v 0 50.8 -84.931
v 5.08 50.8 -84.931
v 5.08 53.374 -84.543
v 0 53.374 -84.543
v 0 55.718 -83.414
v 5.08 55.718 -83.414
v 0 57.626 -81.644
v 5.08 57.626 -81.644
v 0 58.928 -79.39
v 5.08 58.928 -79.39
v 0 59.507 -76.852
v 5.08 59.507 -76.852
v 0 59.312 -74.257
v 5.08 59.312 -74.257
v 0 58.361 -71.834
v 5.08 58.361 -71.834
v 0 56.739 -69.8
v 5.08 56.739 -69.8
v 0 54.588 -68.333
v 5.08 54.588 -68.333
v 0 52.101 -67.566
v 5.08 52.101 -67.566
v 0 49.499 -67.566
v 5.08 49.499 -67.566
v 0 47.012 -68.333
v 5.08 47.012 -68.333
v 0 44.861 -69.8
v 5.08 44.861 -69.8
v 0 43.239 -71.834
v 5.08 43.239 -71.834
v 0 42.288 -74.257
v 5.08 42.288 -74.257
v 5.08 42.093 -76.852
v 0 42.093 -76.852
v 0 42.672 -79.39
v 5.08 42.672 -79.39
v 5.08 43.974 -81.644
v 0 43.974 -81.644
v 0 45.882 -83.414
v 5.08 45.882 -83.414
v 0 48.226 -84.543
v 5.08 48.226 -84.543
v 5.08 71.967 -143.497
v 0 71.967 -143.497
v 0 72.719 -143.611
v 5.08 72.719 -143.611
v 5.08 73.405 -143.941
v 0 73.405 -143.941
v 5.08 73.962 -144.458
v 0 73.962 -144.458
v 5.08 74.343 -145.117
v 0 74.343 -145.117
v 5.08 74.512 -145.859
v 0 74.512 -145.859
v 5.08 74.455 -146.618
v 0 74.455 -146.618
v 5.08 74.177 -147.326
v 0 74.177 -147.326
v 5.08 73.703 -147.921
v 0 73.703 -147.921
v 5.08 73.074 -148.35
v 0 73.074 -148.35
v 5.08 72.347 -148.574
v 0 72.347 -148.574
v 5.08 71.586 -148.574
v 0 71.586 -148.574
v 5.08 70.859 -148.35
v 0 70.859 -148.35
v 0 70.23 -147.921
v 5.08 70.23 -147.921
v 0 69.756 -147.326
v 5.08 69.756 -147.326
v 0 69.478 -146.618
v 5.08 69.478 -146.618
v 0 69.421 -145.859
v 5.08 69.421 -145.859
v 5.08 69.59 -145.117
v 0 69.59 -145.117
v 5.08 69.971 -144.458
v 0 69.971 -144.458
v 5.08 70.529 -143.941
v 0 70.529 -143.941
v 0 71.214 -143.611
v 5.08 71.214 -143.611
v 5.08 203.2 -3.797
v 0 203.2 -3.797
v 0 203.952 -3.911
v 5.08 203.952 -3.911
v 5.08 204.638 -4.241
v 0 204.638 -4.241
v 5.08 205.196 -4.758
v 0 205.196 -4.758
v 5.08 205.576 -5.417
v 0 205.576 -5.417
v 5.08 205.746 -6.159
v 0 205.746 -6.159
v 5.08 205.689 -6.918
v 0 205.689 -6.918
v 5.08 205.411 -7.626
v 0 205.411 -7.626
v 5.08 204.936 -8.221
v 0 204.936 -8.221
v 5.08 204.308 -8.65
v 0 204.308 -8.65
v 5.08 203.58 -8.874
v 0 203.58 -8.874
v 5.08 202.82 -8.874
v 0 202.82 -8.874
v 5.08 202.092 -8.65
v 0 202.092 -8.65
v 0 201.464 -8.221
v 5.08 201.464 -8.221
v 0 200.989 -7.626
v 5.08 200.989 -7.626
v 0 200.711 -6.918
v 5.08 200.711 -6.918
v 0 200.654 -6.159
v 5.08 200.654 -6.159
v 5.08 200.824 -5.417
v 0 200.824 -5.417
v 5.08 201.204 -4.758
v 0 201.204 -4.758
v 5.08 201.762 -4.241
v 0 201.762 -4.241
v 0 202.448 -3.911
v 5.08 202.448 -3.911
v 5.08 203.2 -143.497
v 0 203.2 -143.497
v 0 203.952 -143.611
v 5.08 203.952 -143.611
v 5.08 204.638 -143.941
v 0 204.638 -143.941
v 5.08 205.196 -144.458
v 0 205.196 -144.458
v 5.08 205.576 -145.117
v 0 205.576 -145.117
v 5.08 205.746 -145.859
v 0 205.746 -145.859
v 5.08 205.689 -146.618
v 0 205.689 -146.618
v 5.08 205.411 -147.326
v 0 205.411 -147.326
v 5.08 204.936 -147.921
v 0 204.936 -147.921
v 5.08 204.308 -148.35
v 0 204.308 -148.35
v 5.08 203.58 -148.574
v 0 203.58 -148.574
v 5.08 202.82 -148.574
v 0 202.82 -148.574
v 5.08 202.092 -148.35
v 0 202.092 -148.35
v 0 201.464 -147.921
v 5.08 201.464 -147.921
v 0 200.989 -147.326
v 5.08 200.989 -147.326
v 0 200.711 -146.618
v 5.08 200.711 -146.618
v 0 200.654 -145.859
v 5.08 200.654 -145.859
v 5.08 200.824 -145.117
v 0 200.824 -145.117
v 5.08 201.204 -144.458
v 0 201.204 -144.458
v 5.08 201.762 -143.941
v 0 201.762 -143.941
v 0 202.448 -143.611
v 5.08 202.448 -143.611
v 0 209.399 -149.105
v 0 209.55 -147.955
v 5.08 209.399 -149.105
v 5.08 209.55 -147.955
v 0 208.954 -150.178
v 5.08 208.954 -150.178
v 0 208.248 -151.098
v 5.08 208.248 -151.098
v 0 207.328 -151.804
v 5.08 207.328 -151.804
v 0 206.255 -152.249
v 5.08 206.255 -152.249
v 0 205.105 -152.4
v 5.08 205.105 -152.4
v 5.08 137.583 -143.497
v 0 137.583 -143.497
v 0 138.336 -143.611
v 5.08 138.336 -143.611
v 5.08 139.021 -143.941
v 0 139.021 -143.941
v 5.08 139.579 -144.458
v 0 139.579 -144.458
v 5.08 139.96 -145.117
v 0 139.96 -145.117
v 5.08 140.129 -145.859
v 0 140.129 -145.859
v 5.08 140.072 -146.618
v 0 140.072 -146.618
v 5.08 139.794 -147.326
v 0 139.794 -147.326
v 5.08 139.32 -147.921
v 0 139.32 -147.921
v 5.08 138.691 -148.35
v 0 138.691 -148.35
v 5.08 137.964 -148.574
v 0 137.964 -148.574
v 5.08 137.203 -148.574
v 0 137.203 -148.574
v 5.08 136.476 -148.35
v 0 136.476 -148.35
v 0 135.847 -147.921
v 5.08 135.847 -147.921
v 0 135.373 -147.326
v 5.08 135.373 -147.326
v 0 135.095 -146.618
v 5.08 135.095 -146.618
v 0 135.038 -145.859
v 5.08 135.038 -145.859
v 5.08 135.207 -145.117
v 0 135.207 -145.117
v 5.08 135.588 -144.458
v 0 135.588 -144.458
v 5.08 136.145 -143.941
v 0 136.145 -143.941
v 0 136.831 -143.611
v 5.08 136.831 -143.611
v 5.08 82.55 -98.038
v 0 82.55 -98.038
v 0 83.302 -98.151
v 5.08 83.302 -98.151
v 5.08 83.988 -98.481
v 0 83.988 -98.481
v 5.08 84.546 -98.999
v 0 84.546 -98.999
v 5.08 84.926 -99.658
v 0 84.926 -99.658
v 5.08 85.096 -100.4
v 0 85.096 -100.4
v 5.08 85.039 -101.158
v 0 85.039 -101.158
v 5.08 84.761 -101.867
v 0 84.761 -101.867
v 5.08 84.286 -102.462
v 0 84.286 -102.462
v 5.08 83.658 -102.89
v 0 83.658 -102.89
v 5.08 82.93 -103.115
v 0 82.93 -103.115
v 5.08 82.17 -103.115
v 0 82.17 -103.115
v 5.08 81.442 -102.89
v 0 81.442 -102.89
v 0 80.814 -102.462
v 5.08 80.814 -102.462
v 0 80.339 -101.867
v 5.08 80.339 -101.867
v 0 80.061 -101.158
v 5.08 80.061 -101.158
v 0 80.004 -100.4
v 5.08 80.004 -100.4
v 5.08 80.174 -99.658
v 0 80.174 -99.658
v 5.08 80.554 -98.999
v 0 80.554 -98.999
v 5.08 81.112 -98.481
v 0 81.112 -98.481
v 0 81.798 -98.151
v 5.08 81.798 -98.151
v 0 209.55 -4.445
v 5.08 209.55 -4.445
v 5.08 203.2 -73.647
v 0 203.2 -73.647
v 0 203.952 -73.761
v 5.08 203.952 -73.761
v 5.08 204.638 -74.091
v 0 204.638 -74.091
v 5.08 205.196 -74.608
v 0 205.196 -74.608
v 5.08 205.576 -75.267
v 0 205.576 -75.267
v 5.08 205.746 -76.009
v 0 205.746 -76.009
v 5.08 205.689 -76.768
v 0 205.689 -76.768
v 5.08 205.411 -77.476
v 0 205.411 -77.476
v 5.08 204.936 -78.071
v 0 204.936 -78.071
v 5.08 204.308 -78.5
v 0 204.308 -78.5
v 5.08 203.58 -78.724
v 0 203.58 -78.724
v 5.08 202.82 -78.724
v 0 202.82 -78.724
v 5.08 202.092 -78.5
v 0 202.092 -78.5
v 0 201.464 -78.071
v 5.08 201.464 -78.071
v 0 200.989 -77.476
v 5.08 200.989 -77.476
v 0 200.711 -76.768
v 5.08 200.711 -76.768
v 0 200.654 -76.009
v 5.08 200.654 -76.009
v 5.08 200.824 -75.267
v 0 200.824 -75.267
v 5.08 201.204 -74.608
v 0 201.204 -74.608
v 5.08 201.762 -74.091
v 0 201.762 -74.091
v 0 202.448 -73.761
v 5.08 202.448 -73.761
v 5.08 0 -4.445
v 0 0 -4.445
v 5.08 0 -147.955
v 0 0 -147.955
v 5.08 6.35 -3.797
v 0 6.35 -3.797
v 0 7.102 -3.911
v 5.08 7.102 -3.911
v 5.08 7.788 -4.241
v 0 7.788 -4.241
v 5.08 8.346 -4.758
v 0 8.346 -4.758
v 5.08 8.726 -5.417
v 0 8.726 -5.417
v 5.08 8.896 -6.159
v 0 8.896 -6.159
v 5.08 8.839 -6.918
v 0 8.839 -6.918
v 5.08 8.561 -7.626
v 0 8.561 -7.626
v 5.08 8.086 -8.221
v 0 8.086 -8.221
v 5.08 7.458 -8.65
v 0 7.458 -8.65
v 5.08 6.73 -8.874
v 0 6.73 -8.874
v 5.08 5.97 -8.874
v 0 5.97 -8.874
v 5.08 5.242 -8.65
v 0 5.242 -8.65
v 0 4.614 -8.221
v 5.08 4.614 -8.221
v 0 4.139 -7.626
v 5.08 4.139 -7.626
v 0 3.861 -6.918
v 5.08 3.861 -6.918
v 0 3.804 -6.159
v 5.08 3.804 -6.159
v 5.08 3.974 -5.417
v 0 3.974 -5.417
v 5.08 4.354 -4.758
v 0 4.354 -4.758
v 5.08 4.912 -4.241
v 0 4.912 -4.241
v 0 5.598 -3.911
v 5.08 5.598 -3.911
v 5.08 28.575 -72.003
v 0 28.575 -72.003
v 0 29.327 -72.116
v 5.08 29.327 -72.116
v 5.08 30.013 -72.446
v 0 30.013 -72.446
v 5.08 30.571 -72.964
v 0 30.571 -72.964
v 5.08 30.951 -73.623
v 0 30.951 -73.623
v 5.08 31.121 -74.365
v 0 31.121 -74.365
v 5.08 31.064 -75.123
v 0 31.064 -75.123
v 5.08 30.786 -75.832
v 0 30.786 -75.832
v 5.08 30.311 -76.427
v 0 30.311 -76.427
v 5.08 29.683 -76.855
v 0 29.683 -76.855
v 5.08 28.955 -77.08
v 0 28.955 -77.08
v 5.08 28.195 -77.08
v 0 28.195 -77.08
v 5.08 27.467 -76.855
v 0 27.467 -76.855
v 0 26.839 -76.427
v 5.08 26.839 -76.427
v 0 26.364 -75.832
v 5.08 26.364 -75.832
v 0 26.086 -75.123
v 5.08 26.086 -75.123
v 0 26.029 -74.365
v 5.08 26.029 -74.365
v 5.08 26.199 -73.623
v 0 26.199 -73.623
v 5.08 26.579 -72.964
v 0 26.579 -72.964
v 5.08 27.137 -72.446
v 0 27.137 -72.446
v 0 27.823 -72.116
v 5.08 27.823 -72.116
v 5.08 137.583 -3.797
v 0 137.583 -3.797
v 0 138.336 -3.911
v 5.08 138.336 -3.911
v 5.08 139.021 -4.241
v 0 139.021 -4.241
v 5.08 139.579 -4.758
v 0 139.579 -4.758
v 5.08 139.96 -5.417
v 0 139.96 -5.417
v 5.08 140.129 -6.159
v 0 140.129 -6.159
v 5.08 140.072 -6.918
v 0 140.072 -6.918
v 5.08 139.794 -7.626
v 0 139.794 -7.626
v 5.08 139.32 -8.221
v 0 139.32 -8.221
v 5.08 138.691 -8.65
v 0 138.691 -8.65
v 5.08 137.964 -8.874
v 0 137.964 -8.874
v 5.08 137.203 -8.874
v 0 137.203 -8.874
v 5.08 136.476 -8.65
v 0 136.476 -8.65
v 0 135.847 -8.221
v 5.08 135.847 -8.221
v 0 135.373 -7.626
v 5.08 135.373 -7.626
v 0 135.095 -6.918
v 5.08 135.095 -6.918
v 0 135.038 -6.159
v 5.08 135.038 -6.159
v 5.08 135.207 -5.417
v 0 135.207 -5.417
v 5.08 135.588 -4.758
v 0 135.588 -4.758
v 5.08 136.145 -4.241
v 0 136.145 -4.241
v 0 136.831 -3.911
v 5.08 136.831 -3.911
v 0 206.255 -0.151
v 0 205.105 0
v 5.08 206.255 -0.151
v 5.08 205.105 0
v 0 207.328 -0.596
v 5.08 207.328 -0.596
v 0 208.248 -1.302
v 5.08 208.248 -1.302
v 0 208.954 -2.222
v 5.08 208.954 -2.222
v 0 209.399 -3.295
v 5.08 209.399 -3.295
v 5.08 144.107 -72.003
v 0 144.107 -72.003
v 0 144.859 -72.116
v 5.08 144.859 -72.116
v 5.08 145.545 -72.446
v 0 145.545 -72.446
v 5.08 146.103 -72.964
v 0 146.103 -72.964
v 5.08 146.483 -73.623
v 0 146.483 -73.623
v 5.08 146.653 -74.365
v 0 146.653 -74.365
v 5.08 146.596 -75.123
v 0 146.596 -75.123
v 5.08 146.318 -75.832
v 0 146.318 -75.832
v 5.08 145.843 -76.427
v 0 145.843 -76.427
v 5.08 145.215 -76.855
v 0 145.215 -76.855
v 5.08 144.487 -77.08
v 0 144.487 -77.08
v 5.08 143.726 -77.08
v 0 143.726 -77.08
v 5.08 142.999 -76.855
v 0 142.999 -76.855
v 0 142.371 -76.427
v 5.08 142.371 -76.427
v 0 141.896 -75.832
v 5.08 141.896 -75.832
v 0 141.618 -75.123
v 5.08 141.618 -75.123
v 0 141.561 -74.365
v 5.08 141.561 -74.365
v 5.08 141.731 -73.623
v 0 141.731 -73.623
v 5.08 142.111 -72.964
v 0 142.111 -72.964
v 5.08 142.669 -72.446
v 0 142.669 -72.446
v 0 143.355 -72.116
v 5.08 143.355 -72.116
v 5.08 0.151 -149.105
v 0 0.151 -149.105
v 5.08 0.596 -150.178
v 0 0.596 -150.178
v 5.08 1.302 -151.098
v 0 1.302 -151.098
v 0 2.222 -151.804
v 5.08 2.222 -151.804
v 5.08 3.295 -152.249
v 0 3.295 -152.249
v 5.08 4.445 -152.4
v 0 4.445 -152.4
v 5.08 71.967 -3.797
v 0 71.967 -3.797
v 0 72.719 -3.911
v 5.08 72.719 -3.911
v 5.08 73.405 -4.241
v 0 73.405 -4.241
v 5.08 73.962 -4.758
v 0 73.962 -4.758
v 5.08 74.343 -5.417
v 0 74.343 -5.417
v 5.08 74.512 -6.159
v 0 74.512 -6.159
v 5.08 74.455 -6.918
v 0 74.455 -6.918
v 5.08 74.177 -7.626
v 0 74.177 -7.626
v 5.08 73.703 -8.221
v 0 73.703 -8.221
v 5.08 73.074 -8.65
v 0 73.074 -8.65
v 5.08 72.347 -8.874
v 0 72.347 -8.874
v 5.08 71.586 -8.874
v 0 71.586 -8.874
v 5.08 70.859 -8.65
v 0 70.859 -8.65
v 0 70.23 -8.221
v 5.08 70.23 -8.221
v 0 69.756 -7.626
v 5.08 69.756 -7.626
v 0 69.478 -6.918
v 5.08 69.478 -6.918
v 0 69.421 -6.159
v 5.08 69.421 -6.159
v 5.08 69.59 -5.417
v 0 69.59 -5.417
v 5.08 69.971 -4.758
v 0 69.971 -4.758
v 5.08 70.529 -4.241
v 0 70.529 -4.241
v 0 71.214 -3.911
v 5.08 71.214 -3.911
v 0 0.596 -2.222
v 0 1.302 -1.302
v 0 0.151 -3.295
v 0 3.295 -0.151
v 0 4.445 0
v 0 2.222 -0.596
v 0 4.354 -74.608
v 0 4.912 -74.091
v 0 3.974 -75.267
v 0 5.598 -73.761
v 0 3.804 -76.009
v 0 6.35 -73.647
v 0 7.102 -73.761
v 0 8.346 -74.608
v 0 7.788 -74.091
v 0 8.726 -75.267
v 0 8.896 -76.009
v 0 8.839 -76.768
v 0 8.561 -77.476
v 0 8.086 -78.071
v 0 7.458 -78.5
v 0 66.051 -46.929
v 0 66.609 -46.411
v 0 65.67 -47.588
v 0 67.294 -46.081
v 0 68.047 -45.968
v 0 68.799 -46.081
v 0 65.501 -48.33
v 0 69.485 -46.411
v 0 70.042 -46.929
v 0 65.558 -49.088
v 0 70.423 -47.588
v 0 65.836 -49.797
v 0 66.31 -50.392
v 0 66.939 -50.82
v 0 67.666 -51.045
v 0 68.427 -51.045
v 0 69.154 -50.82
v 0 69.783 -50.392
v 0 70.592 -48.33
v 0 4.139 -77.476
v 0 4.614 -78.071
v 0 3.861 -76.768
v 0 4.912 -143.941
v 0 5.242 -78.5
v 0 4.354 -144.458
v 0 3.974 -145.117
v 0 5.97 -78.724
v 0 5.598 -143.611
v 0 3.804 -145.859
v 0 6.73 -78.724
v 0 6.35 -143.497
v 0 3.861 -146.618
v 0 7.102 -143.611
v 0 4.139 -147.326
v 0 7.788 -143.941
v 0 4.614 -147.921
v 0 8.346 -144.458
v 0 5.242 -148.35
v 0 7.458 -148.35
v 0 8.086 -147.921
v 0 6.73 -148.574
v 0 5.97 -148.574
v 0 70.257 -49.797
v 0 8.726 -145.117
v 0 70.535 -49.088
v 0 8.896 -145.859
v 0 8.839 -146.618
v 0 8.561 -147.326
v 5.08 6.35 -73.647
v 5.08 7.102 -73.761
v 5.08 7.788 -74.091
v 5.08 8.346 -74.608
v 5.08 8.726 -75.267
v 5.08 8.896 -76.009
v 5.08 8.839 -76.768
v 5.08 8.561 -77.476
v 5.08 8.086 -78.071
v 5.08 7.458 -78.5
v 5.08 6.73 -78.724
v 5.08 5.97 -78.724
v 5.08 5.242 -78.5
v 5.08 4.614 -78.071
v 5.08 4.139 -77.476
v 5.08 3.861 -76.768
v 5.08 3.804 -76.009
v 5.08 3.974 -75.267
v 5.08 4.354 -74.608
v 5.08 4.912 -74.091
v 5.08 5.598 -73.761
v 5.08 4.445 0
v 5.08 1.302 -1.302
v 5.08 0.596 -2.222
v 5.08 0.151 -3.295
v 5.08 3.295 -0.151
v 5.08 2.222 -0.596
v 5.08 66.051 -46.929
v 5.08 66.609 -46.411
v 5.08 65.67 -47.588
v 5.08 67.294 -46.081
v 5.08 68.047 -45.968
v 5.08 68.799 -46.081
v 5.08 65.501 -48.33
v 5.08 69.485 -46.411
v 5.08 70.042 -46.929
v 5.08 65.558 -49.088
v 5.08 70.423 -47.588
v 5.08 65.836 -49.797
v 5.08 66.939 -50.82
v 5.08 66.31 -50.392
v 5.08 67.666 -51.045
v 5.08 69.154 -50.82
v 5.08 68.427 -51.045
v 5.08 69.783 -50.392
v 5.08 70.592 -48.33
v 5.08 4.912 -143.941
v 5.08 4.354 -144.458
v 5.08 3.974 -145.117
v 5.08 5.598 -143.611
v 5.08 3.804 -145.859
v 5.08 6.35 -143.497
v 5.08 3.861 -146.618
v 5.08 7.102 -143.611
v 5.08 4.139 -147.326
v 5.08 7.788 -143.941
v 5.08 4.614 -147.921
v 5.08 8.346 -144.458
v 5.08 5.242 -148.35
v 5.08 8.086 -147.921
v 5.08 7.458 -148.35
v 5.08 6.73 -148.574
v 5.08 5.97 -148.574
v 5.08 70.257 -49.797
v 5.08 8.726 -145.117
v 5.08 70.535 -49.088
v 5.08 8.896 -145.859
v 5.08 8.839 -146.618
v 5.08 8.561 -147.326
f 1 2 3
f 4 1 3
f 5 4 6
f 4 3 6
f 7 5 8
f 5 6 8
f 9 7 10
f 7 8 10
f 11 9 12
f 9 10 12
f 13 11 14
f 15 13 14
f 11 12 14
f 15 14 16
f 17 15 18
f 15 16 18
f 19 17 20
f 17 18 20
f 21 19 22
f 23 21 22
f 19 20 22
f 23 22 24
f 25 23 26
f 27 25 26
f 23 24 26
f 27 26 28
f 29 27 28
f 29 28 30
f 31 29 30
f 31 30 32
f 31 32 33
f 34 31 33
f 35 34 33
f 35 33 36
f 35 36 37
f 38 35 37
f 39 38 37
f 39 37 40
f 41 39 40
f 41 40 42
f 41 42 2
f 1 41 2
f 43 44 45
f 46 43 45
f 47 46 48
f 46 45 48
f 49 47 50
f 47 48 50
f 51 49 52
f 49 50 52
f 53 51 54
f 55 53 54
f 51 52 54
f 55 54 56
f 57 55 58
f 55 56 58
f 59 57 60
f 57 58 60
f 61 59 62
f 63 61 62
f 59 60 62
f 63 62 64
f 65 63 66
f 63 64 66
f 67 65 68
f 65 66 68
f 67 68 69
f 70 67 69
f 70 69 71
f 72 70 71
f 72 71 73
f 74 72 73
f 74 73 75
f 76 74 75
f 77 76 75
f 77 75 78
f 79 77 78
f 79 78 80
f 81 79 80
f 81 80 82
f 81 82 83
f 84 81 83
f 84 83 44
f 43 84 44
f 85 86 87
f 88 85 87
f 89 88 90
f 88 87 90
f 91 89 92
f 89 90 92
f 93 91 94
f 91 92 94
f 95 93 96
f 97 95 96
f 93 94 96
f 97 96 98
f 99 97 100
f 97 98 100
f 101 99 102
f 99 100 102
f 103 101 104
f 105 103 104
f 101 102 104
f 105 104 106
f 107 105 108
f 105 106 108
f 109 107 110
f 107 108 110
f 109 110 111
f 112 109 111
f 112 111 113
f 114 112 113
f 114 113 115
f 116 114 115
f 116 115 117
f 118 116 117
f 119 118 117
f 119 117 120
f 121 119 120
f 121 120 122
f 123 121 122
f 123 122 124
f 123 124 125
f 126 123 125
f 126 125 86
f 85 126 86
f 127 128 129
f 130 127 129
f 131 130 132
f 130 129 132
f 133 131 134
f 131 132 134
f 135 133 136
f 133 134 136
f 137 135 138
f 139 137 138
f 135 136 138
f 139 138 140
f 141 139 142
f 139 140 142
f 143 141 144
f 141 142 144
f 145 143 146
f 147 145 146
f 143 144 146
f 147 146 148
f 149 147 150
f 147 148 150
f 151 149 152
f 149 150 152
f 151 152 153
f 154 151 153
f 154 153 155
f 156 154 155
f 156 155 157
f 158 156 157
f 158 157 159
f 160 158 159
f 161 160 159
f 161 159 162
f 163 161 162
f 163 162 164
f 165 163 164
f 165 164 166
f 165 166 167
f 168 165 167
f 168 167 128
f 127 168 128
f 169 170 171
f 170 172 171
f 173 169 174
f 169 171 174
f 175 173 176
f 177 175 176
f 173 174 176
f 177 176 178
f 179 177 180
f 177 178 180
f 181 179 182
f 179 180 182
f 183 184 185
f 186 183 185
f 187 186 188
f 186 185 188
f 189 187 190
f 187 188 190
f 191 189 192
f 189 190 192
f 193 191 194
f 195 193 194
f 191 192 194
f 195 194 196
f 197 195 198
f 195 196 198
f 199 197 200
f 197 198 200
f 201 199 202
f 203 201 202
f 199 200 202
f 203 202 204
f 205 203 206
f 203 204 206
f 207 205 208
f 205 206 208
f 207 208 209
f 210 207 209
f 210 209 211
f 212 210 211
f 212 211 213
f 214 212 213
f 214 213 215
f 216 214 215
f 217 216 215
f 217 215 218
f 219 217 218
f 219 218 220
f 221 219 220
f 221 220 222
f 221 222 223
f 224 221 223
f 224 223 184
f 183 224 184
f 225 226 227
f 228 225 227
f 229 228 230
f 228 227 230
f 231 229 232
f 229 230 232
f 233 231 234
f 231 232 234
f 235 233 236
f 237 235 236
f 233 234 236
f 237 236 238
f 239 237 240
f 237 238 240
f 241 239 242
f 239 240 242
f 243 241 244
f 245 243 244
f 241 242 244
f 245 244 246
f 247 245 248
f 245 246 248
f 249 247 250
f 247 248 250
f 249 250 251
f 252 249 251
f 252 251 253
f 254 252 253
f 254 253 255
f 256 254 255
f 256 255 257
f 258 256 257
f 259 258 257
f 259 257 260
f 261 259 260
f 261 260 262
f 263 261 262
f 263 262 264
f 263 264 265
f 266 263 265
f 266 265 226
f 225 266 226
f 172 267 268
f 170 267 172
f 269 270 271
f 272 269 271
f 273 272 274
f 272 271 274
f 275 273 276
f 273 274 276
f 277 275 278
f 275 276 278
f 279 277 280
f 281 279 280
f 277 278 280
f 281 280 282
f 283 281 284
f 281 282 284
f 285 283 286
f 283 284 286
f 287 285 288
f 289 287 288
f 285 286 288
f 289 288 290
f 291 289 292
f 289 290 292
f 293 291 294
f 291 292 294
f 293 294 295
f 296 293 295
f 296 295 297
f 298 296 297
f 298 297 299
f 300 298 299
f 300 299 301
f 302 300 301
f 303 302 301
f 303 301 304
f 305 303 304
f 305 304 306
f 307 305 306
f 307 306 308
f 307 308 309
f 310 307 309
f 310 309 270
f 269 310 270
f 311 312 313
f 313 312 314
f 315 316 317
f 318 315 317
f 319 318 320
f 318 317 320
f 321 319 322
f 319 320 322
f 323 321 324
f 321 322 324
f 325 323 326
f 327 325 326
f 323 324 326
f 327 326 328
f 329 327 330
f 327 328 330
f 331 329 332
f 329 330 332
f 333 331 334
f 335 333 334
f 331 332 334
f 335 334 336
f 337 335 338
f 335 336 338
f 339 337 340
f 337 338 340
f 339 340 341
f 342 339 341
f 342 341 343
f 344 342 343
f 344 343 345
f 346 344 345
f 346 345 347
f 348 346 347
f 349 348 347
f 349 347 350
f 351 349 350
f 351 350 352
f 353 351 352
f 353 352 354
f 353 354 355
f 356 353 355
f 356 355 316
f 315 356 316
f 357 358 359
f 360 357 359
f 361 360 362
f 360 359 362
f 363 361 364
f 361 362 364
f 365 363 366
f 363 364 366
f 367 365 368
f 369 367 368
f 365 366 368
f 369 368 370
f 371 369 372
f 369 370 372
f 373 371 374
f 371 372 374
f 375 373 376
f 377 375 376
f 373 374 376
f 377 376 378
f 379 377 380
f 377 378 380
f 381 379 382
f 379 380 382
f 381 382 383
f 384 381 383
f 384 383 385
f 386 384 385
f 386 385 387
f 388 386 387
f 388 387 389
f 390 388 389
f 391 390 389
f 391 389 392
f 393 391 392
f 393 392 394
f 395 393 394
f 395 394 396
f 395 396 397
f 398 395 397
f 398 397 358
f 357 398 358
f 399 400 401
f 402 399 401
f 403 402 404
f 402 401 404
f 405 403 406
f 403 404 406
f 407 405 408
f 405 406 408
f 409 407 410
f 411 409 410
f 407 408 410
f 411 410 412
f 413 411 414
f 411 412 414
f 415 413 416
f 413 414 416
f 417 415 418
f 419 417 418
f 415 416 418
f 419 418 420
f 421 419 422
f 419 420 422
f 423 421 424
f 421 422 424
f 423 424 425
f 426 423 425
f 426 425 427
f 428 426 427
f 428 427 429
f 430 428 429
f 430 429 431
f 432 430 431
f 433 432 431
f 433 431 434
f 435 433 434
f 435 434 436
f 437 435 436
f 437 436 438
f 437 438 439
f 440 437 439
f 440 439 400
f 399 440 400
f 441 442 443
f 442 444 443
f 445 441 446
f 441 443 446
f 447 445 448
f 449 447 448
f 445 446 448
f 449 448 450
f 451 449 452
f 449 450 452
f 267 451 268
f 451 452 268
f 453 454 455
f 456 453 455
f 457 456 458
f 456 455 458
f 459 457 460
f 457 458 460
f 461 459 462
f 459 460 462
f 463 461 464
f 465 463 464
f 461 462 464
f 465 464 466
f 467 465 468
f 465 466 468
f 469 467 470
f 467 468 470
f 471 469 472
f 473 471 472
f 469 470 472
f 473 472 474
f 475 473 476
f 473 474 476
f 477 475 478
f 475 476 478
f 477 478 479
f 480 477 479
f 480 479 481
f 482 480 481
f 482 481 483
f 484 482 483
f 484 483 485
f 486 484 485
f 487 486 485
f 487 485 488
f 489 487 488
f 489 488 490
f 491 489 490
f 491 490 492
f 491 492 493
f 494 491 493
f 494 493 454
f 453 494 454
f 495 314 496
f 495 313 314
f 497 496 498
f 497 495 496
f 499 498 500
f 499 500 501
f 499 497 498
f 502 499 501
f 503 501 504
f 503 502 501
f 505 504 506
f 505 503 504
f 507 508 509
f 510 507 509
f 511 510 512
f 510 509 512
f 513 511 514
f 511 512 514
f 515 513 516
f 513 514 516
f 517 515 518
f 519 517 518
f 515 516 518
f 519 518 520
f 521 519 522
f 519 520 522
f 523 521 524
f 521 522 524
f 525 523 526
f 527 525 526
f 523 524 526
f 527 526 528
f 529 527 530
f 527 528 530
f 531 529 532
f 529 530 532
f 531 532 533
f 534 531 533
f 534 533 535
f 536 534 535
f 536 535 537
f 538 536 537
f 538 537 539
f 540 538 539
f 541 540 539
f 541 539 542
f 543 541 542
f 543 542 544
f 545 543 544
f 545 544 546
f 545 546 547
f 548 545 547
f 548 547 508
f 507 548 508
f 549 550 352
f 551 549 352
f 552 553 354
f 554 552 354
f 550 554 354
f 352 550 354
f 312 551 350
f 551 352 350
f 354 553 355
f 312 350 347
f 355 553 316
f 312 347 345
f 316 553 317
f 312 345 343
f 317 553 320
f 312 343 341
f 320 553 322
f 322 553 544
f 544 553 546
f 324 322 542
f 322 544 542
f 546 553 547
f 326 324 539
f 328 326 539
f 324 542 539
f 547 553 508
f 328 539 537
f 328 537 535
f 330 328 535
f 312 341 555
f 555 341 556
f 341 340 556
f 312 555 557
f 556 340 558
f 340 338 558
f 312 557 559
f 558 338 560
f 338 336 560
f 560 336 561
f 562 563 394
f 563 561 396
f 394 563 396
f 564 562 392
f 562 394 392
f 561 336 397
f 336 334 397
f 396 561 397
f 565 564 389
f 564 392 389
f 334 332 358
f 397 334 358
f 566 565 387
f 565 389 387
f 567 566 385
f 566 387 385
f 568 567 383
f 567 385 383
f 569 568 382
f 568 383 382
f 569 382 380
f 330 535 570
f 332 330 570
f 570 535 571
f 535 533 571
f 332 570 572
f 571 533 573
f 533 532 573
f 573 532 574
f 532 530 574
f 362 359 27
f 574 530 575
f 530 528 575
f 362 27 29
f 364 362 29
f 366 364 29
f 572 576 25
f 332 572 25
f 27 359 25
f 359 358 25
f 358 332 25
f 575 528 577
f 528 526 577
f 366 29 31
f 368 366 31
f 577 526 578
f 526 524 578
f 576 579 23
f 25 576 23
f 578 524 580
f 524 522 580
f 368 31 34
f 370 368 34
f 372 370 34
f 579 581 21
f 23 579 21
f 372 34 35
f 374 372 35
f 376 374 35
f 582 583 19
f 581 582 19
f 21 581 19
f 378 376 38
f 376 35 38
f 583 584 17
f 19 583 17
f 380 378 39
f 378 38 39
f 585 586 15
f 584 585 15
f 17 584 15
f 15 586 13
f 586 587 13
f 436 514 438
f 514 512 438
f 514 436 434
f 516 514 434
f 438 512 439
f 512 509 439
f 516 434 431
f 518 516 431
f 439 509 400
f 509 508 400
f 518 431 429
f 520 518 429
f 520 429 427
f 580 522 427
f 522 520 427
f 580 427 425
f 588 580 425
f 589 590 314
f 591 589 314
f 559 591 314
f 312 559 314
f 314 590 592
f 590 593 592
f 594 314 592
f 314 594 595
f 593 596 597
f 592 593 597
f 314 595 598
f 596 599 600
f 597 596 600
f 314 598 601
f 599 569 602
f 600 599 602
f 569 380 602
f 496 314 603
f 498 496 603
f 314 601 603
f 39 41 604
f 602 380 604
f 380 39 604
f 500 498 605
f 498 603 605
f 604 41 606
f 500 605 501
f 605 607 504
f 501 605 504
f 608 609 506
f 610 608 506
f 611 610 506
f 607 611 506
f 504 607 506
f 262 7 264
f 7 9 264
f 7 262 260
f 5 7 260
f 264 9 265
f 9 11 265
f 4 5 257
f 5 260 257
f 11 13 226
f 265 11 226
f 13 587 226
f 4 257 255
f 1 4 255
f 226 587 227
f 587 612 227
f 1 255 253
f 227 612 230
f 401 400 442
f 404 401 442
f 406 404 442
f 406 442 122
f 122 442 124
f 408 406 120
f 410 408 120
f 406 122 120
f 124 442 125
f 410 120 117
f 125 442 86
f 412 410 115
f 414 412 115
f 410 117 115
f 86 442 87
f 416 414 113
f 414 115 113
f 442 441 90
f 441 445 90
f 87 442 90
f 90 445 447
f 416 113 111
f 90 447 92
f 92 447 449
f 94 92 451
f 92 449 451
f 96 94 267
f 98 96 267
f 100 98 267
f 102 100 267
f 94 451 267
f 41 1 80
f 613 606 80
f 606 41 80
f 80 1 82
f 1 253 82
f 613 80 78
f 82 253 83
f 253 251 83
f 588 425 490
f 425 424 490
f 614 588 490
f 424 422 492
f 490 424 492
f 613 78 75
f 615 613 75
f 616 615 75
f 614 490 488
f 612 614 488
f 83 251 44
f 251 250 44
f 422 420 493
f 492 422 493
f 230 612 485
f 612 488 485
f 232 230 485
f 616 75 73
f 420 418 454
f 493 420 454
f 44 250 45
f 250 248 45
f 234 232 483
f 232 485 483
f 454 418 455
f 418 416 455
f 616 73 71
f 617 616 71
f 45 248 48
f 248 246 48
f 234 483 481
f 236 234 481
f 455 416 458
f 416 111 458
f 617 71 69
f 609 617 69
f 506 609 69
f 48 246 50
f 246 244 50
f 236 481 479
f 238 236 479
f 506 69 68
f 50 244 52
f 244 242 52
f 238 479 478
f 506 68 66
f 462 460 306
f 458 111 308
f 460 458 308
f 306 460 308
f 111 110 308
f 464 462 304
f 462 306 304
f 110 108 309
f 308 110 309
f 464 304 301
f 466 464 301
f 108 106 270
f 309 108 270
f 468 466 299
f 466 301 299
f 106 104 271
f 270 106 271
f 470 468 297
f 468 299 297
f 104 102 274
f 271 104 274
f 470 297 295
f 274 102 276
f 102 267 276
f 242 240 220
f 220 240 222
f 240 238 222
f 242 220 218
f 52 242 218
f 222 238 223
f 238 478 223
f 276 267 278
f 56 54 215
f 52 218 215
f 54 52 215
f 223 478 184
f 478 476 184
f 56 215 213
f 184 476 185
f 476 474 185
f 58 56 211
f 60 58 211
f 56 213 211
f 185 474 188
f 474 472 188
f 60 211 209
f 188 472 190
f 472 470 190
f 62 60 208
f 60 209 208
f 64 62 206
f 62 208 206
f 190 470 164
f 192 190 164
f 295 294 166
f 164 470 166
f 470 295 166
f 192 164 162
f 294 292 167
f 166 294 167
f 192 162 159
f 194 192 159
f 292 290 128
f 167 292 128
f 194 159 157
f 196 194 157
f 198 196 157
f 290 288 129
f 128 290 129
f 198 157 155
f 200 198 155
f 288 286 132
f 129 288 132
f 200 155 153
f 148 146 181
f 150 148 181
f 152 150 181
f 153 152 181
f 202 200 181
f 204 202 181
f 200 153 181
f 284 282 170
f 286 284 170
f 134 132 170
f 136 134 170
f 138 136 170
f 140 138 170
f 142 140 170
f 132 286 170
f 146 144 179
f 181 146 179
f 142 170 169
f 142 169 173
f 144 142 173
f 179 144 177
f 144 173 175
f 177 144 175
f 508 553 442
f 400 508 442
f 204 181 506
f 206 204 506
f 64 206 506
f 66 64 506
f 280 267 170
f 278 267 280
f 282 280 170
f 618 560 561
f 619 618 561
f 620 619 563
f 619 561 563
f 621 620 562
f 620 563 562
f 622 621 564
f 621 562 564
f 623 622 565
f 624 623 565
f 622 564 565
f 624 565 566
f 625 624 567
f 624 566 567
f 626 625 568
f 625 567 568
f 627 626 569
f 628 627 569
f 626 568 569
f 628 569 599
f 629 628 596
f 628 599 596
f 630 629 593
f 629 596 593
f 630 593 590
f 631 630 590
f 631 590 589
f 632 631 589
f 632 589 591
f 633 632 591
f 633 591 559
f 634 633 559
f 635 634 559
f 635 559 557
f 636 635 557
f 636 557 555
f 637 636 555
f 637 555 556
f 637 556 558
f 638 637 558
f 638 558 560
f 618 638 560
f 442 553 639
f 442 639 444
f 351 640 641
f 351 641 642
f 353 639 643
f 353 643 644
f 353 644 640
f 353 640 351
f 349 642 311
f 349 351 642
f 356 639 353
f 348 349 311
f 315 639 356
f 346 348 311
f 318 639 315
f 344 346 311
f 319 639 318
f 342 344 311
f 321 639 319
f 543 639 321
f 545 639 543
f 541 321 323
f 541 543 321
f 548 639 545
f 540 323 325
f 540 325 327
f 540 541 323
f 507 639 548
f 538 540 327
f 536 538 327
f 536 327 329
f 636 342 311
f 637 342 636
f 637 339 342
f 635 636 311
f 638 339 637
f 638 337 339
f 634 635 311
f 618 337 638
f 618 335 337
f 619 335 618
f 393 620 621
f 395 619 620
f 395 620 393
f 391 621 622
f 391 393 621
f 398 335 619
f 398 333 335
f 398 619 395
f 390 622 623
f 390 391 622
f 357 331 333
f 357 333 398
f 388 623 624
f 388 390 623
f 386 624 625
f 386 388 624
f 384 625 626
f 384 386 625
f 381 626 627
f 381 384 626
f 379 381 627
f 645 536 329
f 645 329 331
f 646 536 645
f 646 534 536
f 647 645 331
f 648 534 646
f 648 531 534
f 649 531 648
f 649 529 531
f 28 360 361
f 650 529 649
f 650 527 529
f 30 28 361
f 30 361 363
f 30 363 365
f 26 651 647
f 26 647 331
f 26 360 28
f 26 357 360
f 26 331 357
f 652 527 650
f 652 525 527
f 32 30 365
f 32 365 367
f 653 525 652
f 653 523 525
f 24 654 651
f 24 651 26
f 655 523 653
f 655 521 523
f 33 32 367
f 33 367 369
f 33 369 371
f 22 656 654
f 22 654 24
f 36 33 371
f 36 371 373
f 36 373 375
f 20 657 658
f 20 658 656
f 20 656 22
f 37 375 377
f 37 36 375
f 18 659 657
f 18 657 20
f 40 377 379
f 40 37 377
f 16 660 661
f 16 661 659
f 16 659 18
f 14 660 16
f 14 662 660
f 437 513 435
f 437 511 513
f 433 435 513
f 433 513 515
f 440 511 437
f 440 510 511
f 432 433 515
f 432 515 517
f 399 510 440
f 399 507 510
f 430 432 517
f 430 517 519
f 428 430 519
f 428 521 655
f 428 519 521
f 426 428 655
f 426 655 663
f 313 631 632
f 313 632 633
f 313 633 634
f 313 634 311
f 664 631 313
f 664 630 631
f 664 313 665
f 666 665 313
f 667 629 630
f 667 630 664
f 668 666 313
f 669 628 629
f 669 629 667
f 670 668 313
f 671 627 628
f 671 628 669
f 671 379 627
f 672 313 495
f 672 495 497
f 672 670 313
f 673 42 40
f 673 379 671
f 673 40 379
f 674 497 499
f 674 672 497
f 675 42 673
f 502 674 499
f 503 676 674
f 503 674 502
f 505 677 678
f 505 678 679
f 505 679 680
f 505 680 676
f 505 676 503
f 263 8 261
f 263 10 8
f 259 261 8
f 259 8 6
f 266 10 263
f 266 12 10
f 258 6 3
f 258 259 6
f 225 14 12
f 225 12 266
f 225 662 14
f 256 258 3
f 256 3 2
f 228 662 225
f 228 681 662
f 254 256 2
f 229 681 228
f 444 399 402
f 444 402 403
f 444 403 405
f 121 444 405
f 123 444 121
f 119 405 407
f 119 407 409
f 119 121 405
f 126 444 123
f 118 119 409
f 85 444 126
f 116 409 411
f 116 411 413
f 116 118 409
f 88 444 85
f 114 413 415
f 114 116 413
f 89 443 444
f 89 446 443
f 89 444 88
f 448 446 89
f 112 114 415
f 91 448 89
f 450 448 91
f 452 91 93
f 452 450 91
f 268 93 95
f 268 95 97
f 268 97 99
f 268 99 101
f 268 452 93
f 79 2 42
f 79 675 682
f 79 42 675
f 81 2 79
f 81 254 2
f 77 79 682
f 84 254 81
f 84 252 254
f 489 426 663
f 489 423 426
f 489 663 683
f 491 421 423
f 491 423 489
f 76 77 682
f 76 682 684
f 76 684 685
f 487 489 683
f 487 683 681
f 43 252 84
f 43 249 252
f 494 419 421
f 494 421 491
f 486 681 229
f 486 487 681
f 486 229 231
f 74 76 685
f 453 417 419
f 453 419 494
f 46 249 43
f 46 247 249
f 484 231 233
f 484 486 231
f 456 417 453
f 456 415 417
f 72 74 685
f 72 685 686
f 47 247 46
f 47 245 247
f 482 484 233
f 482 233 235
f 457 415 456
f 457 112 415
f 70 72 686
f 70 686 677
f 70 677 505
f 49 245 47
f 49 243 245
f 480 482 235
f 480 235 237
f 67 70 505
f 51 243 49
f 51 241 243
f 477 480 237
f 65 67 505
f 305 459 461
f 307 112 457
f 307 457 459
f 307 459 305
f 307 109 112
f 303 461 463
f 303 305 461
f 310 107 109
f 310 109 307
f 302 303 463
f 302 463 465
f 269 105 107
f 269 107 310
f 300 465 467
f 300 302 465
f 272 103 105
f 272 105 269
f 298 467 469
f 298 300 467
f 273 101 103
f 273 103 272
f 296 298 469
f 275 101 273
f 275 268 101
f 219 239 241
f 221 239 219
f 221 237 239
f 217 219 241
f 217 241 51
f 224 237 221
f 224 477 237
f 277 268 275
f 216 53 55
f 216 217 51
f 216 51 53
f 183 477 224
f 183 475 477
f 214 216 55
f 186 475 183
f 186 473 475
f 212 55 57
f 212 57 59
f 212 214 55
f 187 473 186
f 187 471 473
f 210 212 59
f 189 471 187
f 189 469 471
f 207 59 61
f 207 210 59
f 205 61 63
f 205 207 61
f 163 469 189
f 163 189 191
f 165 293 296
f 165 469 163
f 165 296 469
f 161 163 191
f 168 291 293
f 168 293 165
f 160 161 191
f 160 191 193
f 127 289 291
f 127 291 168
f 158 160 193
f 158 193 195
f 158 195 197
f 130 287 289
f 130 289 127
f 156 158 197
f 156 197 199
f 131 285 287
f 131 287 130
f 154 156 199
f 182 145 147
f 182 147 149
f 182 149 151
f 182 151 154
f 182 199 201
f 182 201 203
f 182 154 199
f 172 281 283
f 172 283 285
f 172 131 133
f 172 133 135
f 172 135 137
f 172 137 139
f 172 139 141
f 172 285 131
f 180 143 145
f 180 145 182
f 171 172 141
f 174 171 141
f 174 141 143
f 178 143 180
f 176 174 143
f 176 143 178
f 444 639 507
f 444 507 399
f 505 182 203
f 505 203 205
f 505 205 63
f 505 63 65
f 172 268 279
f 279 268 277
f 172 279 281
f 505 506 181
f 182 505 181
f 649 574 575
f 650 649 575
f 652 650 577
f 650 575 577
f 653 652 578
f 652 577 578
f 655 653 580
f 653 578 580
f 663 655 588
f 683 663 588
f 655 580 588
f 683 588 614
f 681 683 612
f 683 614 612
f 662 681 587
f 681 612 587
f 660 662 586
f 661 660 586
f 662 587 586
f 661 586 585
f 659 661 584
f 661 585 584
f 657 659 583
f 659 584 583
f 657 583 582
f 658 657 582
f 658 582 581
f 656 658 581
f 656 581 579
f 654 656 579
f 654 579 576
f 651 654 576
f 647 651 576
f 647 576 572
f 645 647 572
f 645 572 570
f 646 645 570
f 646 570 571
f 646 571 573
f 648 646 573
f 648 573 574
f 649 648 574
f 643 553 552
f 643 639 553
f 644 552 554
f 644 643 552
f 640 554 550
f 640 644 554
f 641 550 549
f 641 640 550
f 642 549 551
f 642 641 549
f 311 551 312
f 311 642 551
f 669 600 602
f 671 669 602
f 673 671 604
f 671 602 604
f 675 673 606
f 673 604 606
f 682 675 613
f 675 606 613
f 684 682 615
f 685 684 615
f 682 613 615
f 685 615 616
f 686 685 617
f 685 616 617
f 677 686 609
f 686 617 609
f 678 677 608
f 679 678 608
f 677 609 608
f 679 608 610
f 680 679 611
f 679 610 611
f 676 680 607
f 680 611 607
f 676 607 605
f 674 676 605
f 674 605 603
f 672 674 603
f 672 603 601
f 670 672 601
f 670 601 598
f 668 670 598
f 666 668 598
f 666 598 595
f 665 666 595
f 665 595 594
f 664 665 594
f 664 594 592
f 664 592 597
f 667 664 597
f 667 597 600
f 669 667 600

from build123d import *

# Parameters (mm, degrees)
SKETCH1_W              = 152.4
SKETCH1_H              = 209.55
BOSS_EXTRUDE2_DEPTH    = 5.08
SKETCH2_R              = 8.73125
CUT_EXTRUDE1_DEPTH     = 6.08
F_10_CLEARANCE_HOLE2_D = 5.1054
FILLET1_R              = 4.445
F_10_CLEARANCE_HOLE1_D = 5.1054


with BuildPart() as part:
    # Sketch1 → Boss-Extrude2 (new body)
    with BuildSketch(Plane(origin=(0, 0, 0), x_dir=(0, 0, -1), z_dir=(1, 0, 0))):
        with Locations((76.2, 104.775)):
            Rectangle(SKETCH1_W, SKETCH1_H)
    extrude(amount=BOSS_EXTRUDE2_DEPTH)

    # Sketch2 → Cut-Extrude1 (cut, through all)
    with BuildSketch(Plane(origin=(5.08, 0, 0), x_dir=(0, 0, -1), z_dir=(1, 0, 0))):
        with Locations((76.2, 50.8)):
            Circle(SKETCH2_R)
    extrude(amount=-CUT_EXTRUDE1_DEPTH, mode=Mode.SUBTRACT)

    # #10 Clearance Hole2 (through all)
    with Locations(Plane(origin=(5.08, 0, 0), x_dir=(0, 0, -1), z_dir=(1, 0, 0))):
        with Locations((48.520375625, 68.0466), (74.555375625, 144.106959494), (100.590375625, 82.55), (74.555375625, 28.575)):
            Hole(F_10_CLEARANCE_HOLE2_D / 2)

    # Fillet1
    fillet1_edges = [part.edges().sort_by_distance(p)[0] for p in [
        (2.54, 209.55, 0),
        (2.54, 209.55, -152.4),
        (2.54, 0, -152.4),
        (2.54, 0, 0),
    ]]
    fillet(fillet1_edges, radius=FILLET1_R)

    # #10 Clearance Hole1 (through all)
    with Locations(Plane(origin=(5.08, 0, 0), x_dir=(0, 0, -1), z_dir=(1, 0, 0))):
        with Locations((6.35, 203.2), (146.05, 6.35), (6.35, 6.35), (146.05, 203.2), (76.2, 6.35), (76.2, 203.2), (6.35, 137.583333333), (6.35, 71.966666667), (146.05, 71.966666667), (146.05, 137.583333333)):
            Hole(F_10_CLEARANCE_HOLE1_D / 2)


solid = part.part
